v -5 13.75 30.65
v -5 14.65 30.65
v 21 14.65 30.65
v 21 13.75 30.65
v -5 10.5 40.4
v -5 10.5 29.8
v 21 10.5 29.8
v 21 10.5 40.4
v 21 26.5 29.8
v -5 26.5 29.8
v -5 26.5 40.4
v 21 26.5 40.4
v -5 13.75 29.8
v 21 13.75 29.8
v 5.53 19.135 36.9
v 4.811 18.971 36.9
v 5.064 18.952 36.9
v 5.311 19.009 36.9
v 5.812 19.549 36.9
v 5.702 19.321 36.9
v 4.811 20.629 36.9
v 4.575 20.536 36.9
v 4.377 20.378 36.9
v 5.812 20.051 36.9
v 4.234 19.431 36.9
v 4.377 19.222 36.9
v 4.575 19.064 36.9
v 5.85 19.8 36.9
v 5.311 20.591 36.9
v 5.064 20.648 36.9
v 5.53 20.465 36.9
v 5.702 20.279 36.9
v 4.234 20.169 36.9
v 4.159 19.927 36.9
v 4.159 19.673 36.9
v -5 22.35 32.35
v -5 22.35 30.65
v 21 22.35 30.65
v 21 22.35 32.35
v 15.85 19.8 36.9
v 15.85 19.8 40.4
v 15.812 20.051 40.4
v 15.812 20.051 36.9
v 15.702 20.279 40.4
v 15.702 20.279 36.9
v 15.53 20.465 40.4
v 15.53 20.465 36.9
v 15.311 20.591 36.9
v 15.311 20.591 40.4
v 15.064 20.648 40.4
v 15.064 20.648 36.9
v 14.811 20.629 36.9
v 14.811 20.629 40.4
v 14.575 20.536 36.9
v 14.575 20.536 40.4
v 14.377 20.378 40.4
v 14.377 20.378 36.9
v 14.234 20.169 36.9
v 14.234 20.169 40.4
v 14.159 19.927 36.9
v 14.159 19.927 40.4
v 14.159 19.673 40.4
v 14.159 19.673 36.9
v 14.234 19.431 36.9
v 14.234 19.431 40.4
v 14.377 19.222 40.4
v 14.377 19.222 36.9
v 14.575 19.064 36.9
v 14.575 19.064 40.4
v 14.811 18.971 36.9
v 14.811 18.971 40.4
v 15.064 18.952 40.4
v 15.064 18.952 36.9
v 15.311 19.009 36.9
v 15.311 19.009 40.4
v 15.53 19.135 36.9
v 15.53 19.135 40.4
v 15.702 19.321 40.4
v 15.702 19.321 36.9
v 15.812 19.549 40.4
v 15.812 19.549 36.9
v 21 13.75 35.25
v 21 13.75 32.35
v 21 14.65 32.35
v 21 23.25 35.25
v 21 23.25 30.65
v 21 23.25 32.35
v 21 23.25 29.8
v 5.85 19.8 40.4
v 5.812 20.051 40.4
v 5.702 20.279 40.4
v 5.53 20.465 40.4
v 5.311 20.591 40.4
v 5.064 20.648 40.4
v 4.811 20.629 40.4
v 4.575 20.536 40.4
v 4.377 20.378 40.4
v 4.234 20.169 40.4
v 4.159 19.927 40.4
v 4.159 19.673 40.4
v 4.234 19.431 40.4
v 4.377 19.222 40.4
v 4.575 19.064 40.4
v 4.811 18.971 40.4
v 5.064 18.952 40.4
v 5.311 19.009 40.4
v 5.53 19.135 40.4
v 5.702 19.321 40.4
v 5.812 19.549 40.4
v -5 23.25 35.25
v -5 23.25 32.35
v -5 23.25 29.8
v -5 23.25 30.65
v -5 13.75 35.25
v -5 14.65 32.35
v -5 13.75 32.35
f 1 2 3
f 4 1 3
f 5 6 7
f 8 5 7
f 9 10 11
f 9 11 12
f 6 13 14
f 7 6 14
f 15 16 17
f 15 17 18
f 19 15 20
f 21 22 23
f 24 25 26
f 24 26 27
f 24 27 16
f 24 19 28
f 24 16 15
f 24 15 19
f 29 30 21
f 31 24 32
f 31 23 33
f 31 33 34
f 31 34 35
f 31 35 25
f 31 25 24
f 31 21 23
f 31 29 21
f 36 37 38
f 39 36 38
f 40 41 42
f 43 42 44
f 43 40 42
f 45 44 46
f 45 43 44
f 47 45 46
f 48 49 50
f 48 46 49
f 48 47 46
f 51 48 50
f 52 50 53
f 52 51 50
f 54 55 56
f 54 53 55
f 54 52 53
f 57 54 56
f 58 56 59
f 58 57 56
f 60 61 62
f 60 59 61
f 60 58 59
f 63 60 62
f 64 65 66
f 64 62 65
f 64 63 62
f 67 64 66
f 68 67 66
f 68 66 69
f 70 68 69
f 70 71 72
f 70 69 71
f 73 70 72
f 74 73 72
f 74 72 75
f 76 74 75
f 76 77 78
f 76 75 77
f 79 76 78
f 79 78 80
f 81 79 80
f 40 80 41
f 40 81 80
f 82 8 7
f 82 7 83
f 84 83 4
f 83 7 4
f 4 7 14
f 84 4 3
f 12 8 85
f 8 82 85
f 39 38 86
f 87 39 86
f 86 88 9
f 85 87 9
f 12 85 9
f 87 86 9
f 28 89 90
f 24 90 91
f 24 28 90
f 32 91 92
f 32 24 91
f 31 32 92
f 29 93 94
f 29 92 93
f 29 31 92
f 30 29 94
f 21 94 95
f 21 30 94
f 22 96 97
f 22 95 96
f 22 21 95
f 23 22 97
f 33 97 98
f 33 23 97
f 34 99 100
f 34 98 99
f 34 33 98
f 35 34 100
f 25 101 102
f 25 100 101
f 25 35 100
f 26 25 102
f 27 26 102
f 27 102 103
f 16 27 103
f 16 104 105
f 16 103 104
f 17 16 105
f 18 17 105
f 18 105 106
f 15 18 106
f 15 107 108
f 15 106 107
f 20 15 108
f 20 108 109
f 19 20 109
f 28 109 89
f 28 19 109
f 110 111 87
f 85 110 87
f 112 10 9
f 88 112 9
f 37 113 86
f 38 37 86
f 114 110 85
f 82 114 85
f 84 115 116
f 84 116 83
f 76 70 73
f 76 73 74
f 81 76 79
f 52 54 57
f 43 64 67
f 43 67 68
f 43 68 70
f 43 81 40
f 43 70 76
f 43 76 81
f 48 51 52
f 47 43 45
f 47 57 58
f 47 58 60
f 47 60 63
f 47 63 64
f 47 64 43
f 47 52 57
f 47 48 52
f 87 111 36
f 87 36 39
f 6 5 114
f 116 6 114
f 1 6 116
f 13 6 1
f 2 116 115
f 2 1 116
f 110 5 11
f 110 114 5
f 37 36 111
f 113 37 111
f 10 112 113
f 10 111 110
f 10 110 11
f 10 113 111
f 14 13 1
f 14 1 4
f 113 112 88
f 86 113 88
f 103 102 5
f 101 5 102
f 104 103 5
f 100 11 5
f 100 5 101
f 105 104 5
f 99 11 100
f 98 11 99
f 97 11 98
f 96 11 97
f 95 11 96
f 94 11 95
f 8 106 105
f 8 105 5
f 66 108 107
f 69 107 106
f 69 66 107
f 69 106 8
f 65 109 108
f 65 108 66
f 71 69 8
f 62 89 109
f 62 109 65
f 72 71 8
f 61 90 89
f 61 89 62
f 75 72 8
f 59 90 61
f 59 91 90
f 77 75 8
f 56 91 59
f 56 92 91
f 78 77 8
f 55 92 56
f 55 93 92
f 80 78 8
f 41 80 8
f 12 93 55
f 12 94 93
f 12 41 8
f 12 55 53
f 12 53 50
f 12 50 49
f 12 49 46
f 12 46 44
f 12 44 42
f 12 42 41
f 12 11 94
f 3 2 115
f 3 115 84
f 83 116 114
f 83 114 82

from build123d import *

# Parameters (mm, degrees)
CARRIAGE_START                    = 29.8
CARRIAGE_BLOCK_PROFILE_W          = 26
CARRIAGE_BLOCK_PROFILE_H          = 16
CARRIAGE_BLOCK_DEPTH              = 10.6
RAIL_START                        = 29.7
RAIL_RUNNING_CLEARANCE_PROFILE_W  = 26.2
RAIL_RUNNING_CLEARANCE_PROFILE_H  = 9.5
RAIL_RUNNING_CLEARANCE_DEPTH      = 5.55
LONGITUDINAL_START                = 30.65
LONGITUDINAL_GUIDE_KEYS_PROFILE_W = 26
LONGITUDINAL_GUIDE_KEYS_PROFILE_H = 1
LONGITUDINAL_GUIDE_KEYS_DEPTH     = 1.7
CARRIAGE_START_2                  = 36.9
CARRIAGE_SCREW_PILOTS_PROFILE_R   = 0.85
CARRIAGE_SCREW_PILOTS_DEPTH       = 3.6


with BuildPart() as part:
    # Carriage block profile → Carriage block (new body)
    with BuildSketch(Plane.XY.offset(CARRIAGE_START)):
        with Locations((8, 18.5)):
            Rectangle(CARRIAGE_BLOCK_PROFILE_W, CARRIAGE_BLOCK_PROFILE_H)
    extrude(amount=CARRIAGE_BLOCK_DEPTH)

    # Rail running clearance profile → Rail running clearance (cut)
    with BuildSketch(Plane.XY.offset(RAIL_START)):
        with Locations((8, 18.5)):
            Rectangle(RAIL_RUNNING_CLEARANCE_PROFILE_W, RAIL_RUNNING_CLEARANCE_PROFILE_H)
    extrude(amount=RAIL_RUNNING_CLEARANCE_DEPTH, mode=Mode.SUBTRACT)

    # Longitudinal guide keys profile → Longitudinal guide keys (add)
    with BuildSketch(Plane.XY.offset(LONGITUDINAL_START)):
        with Locations((8, 14.15)):
            Rectangle(LONGITUDINAL_GUIDE_KEYS_PROFILE_W, LONGITUDINAL_GUIDE_KEYS_PROFILE_H)
        with Locations((8, 22.85)):
            Rectangle(LONGITUDINAL_GUIDE_KEYS_PROFILE_W, LONGITUDINAL_GUIDE_KEYS_PROFILE_H)
    extrude(amount=LONGITUDINAL_GUIDE_KEYS_DEPTH)

    # Carriage screw pilots profile → Carriage screw pilots (cut)
    with BuildSketch(Plane.XY.offset(CARRIAGE_START_2)):
        with Locations((5, 19.8)):
            Circle(CARRIAGE_SCREW_PILOTS_PROFILE_R)
        with Locations((15, 19.8)):
            Circle(CARRIAGE_SCREW_PILOTS_PROFILE_R)
    extrude(amount=CARRIAGE_SCREW_PILOTS_DEPTH, mode=Mode.SUBTRACT)


solid = part.part
